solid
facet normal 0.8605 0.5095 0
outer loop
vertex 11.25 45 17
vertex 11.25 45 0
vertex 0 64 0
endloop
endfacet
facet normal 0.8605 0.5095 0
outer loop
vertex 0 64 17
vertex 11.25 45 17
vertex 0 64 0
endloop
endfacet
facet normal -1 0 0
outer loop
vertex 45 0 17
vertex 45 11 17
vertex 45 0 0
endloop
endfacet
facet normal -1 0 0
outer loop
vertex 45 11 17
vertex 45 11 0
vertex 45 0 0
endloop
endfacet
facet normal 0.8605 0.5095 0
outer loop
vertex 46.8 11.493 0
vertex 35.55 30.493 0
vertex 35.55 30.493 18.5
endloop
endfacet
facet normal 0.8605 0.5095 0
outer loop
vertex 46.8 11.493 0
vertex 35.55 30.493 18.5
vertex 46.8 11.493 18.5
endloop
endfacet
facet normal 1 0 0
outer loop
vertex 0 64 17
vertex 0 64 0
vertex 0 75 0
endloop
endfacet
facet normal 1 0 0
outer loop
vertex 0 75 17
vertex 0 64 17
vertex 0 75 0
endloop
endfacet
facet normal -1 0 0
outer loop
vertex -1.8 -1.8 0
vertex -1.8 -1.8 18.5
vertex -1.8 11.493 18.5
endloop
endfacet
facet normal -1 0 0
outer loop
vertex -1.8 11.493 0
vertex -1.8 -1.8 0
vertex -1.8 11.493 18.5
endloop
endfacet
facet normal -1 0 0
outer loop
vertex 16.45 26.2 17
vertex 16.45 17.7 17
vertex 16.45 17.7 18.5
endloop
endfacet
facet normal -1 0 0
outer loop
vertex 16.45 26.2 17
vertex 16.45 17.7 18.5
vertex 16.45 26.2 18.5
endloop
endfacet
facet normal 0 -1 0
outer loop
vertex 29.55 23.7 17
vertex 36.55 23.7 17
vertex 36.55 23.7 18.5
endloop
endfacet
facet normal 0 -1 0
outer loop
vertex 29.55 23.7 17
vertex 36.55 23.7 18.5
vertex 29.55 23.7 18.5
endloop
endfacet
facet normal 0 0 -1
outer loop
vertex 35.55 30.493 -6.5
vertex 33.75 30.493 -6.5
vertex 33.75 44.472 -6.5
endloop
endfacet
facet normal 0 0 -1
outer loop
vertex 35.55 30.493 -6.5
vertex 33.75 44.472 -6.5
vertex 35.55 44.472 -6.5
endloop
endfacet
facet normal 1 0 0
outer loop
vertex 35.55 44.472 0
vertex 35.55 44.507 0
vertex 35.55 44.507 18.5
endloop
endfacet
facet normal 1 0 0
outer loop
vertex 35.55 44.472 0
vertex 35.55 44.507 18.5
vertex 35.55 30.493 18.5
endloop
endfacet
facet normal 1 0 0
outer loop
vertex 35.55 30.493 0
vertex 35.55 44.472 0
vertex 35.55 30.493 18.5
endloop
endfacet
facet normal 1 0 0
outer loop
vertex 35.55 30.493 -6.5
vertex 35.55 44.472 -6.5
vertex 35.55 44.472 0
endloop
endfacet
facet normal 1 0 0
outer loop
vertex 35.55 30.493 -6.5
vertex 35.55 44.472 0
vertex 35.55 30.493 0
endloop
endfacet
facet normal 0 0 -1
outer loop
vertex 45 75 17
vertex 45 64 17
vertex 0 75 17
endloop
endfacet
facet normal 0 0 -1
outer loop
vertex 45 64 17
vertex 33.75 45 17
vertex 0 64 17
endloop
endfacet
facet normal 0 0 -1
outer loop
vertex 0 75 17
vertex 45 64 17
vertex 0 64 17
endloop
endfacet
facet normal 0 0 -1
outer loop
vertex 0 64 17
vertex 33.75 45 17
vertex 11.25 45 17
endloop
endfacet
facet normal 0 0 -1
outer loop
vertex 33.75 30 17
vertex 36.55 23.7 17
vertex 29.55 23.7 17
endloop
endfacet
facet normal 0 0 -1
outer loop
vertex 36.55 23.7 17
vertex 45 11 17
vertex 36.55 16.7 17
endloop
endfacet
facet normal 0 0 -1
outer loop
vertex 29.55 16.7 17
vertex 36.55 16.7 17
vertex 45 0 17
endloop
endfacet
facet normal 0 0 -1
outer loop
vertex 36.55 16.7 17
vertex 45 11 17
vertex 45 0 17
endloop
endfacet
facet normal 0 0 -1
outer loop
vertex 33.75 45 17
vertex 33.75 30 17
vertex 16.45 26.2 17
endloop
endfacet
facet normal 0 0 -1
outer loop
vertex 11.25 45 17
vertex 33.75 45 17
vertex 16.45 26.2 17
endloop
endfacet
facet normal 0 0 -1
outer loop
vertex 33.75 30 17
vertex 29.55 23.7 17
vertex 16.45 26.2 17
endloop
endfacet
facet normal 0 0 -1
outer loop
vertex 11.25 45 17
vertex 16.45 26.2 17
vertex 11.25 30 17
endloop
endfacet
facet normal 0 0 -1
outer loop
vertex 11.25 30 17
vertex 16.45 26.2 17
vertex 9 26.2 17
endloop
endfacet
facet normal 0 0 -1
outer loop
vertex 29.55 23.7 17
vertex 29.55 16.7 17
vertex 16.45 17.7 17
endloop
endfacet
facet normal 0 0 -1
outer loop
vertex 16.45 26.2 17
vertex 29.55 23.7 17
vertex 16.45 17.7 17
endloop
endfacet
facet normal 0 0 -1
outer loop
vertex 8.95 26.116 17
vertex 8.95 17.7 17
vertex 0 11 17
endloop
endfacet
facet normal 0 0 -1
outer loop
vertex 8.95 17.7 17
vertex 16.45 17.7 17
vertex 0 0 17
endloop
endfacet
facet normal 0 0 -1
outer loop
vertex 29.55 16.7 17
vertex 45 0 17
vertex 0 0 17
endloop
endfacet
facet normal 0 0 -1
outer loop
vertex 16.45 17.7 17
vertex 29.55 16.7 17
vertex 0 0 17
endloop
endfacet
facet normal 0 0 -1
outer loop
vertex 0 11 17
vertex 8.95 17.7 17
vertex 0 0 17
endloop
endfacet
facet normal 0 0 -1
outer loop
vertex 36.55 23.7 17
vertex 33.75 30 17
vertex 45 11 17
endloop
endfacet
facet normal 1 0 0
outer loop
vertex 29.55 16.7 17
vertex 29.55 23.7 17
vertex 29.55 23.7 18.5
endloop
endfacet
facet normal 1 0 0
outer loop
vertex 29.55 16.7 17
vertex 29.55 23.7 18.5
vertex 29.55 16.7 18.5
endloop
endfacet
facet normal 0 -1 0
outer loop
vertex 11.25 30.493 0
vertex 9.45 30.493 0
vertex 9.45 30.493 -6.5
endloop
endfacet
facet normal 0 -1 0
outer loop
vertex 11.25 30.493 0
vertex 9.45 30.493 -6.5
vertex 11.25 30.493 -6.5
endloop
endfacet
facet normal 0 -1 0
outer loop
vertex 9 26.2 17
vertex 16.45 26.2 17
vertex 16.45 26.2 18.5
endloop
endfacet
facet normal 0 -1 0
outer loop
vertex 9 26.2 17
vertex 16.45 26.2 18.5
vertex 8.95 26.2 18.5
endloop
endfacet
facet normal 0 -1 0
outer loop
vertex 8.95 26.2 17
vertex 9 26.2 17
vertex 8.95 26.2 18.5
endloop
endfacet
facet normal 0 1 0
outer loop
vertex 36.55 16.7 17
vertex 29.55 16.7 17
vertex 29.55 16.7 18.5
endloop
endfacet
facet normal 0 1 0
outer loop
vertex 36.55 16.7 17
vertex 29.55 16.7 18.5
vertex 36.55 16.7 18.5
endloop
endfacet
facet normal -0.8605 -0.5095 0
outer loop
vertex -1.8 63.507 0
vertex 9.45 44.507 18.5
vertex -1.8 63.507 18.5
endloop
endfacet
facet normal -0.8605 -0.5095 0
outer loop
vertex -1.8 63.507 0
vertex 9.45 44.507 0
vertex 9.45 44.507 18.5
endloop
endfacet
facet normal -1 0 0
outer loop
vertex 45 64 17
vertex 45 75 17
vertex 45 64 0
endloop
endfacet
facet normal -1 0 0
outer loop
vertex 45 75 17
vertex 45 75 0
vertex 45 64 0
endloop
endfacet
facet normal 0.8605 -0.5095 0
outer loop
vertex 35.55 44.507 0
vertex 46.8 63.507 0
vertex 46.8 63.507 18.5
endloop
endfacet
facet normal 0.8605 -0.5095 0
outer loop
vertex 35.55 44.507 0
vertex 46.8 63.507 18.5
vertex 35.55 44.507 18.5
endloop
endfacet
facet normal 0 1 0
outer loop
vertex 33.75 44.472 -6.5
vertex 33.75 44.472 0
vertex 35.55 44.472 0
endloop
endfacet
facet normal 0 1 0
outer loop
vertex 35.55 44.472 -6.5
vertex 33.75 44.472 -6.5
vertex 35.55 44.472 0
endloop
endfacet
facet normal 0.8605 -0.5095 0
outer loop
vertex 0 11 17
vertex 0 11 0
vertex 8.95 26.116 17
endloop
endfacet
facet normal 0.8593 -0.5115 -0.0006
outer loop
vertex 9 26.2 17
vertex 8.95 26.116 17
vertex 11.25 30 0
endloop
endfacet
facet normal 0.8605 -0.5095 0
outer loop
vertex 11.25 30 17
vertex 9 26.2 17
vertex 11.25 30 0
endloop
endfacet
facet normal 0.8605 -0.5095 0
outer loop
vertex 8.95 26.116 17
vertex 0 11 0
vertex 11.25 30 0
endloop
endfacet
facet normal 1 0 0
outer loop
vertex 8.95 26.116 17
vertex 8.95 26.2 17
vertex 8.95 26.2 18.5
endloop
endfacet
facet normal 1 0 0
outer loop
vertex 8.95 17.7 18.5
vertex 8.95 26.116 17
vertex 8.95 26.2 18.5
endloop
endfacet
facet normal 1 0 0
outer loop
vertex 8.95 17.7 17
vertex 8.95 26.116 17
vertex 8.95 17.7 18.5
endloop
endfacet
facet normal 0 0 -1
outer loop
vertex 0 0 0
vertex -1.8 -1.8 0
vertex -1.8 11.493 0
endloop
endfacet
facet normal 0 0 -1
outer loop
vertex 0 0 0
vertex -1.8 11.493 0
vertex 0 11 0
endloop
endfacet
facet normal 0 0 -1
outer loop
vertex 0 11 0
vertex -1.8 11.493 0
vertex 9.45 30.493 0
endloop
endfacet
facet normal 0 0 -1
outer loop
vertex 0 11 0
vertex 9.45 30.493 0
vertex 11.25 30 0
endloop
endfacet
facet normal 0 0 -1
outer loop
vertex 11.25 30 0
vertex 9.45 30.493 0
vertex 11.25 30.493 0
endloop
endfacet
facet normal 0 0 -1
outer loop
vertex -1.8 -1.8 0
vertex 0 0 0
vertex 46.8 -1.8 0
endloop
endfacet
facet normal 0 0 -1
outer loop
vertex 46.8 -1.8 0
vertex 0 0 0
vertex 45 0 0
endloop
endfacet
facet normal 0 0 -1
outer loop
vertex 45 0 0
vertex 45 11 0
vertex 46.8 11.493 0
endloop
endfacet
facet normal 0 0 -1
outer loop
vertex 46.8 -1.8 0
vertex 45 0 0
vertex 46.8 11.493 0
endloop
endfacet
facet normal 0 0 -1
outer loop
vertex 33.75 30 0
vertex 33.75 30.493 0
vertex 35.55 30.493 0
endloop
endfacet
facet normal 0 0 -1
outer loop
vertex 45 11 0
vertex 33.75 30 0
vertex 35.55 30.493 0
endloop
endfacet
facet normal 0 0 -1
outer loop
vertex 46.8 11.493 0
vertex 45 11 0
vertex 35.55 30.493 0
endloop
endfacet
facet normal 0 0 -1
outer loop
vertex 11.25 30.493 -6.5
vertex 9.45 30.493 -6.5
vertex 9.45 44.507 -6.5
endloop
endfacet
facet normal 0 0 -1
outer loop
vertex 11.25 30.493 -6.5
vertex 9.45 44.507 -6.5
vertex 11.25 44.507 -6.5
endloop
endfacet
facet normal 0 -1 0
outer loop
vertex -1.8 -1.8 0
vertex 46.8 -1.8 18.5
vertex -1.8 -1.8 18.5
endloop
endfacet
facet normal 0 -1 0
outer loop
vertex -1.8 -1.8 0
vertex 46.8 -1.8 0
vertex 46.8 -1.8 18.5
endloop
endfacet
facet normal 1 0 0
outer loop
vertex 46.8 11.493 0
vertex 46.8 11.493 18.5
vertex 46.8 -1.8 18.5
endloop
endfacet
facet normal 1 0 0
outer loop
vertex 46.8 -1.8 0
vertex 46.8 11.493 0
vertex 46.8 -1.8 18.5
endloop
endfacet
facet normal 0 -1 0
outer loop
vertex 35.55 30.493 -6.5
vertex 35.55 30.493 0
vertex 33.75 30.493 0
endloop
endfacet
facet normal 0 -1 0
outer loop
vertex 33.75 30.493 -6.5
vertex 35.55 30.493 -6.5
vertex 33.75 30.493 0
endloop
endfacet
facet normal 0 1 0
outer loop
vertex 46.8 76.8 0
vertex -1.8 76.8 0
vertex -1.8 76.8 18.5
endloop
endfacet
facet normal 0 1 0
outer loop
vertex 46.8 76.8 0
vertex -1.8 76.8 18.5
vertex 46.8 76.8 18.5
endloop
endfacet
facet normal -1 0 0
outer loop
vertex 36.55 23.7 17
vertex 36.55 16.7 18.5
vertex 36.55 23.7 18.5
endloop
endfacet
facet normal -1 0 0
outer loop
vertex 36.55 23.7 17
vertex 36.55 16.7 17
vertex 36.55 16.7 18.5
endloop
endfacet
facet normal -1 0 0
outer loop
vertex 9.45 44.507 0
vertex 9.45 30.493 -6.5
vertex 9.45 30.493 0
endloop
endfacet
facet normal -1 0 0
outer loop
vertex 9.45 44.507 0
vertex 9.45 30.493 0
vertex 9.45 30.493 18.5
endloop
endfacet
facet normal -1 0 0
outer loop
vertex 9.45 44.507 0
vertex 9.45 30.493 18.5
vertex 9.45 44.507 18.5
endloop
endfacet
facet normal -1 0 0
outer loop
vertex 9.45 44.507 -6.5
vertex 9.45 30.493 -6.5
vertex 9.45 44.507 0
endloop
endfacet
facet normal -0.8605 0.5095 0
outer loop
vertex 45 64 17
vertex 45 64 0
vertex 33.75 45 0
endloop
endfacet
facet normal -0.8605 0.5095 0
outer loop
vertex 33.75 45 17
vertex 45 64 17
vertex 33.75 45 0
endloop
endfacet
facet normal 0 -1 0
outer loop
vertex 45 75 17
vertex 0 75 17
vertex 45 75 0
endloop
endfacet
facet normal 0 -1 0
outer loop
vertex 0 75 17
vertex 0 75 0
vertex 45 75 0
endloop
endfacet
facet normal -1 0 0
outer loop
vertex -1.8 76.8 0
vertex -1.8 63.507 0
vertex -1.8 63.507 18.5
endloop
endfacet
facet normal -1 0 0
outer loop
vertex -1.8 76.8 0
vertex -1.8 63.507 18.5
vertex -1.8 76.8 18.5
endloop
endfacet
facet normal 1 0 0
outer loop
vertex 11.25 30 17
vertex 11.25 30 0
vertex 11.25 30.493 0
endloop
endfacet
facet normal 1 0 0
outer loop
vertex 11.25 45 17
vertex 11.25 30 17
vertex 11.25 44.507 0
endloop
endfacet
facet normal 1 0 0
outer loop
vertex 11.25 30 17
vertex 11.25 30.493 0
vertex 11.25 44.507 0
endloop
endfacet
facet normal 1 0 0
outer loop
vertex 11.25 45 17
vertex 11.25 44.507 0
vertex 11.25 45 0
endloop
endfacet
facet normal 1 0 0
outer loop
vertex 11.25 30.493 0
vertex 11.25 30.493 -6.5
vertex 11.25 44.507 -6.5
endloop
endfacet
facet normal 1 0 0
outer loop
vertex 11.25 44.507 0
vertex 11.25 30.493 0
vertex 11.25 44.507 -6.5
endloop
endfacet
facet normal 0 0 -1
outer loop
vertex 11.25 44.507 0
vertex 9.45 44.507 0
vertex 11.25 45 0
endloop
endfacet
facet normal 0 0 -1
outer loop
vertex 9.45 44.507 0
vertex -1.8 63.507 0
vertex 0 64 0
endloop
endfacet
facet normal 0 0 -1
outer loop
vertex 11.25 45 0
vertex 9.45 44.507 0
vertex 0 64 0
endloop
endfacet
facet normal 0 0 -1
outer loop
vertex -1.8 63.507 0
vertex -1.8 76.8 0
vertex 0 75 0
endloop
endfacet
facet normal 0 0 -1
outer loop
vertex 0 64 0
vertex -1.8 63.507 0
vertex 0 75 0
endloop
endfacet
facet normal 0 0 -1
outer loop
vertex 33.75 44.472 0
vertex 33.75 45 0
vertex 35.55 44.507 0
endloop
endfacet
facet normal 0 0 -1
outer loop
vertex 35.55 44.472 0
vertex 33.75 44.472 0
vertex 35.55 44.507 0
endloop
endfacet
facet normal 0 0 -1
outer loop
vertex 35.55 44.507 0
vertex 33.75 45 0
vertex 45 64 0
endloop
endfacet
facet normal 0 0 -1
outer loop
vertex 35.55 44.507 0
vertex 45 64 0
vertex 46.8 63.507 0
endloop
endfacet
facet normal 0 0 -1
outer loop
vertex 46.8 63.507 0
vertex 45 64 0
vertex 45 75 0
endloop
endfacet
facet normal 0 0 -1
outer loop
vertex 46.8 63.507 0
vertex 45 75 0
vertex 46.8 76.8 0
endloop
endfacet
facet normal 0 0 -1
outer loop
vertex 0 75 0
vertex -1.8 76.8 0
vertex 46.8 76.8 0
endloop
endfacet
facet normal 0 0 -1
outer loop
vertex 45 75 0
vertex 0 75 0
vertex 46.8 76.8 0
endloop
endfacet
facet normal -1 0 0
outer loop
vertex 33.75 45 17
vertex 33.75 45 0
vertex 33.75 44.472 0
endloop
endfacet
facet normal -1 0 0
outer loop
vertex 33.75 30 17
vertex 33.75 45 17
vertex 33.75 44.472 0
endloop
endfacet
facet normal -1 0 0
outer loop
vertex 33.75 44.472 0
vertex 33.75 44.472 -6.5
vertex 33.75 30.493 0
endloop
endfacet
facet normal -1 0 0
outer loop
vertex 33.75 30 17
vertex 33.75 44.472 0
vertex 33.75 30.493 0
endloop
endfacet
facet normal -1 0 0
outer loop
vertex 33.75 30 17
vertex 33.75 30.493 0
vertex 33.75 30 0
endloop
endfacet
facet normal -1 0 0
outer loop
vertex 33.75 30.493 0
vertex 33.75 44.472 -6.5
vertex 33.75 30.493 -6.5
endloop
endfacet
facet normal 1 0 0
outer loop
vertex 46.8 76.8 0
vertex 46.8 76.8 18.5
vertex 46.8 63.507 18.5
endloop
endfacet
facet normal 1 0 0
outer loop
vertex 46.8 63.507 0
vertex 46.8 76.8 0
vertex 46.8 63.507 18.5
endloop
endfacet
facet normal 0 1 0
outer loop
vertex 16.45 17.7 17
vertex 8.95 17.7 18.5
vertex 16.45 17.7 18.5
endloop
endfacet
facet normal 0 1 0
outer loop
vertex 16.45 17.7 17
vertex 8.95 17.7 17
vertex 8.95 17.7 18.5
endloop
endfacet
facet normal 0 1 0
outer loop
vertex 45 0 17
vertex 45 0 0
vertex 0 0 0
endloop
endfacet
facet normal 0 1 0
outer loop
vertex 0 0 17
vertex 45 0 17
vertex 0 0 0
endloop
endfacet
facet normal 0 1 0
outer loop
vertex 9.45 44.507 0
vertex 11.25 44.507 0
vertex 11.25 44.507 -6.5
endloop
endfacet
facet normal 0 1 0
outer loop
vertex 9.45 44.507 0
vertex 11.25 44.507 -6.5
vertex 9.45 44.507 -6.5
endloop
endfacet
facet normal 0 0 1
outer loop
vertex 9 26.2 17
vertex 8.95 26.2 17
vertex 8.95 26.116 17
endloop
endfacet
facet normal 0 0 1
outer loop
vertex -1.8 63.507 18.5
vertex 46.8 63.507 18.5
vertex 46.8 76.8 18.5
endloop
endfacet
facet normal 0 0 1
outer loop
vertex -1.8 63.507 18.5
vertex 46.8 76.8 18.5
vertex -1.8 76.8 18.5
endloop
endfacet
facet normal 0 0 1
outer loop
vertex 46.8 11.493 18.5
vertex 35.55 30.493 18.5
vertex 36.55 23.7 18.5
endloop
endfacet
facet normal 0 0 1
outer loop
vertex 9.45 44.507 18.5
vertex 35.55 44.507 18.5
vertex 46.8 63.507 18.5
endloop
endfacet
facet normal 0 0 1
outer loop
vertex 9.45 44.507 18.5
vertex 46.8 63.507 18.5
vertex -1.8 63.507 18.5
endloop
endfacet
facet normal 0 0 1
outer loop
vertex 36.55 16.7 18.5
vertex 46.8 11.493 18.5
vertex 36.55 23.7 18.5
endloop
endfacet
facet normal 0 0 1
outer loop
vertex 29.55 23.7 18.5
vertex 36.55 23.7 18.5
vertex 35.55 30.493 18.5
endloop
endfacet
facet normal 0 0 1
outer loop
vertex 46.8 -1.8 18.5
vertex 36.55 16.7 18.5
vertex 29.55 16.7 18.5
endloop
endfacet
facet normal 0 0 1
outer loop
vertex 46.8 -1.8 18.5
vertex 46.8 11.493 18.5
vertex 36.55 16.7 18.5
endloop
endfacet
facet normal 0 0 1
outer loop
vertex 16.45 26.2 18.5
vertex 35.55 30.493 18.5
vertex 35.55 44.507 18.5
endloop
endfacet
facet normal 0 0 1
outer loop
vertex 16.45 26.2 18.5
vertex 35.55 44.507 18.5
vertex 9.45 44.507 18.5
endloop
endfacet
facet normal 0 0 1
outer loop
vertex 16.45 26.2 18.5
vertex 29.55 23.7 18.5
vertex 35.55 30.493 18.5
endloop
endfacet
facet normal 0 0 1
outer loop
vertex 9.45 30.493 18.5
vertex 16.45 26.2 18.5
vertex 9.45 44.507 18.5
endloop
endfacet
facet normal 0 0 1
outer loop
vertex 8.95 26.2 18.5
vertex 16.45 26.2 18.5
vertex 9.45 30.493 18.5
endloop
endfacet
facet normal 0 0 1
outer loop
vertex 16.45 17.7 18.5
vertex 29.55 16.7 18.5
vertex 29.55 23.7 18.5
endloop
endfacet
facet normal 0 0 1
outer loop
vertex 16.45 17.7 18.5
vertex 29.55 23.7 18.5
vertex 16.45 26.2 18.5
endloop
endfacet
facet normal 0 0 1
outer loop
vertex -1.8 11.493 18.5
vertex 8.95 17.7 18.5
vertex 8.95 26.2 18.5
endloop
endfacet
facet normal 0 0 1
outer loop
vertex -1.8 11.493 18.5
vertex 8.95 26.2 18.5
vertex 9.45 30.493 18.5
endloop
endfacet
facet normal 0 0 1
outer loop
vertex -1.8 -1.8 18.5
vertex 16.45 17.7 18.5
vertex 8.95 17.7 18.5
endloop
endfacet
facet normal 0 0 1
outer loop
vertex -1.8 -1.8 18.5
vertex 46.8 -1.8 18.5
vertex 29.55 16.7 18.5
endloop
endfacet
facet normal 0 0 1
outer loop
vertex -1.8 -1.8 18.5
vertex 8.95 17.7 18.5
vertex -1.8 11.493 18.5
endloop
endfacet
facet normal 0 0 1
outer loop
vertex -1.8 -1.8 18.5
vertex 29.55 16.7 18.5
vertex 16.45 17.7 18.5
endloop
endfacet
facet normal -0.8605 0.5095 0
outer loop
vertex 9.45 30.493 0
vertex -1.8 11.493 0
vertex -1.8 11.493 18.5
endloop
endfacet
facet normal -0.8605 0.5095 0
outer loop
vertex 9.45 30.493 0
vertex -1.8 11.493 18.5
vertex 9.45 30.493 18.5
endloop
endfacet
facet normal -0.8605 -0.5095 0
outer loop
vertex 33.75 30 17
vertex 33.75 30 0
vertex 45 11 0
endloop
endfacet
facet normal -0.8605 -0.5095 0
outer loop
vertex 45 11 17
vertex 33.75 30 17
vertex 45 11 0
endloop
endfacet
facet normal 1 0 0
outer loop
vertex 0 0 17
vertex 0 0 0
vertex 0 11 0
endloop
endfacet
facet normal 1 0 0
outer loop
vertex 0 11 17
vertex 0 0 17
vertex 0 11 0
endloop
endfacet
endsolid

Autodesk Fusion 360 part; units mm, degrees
sketch "Sketch1" plane through (0, 0, 0) normal (0, 0, 1) x (1, 0, 0)
  line L0 (0, 0) -> (0, 11)
  line L1 (0, 11) -> (11.25, 30)
  line L2 (11.25, 30) -> (11.25, 45)
  line L3 (0, 75) -> (45, 75)
  line L4 (33.75, 45) -> (33.75, 30)
  line L5 (33.75, 30) -> (45, 11)
  line L6 (45, 11) -> (45, 0)
  line L7 (45, 0) -> (0, 0)
  line L8 (11.25, 45) -> (0, 64)
  line L9 (0, 64) -> (0, 75)
  line L10 (45, 75) -> (45, 64)
  line L11 (45, 64) -> (33.75, 45)
  line L12 (-1.8, 76.8) -> (46.8, 76.8)
  line L13 (46.8, 76.8) -> (46.8, 63.5071)
  line L14 (46.8, 63.5071) -> (35.55, 44.5071)
  line L15 (35.55, 44.5071) -> (35.55, 30.4929)
  line L16 (35.55, 30.4929) -> (46.8, 11.4929)
  line L17 (46.8, 11.4929) -> (46.8, -1.8)
  line L18 (46.8, -1.8) -> (-1.8, -1.8)
  line L19 (-1.8, -1.8) -> (-1.8, 11.4929)
  line L20 (-1.8, 11.4929) -> (9.45, 30.4929)
  line L21 (9.45, 30.4929) -> (9.45, 44.5071)
  line L22 (9.45, 44.5071) -> (-1.8, 63.5071)
  line L23 (-1.8, 63.5071) -> (-1.8, 76.8)
  dimension "d1" = 75
  dimension "d2" = 45
  dimension "d3" = 45
  dimension "d4" = 11
  dimension "d5" = 11
  dimension "d7" = 30
  dimension "d8" = 30
  dimension "d9" = 30
  dimension "d10" = 30
  dimension "d13" = 11.25
  dimension "d14" = 90
  dimension "d15" = 11
  dimension "d16" = 11
  dimension "d17" = 11.25
  dimension "d18" = 11.25
  dimension "d19" = 1.8
  dimension "d20" = 1.8
  dimension "d21" = 1.8
  dimension "d22" = 1.8
  dimension "d24" = 1.8
  dimension "d25" = 1.8
  dimension "d26" = 1.8
  dimension "d27" = 1.8
  dimension "d28" = 1.8
  dimension "d29" = 1.8
  dimension "d30" = 1.8
  dimension "d31" = 1.8
extrude "Extrude1" add sketch "Sketch1" along normal blind 17
sketch "Sketch2" plane through (0, 0, 17) normal (0, 0, 1) x (-1, 0, 0)
  line L0 (-45, -75) -> (-45, -64)
  line L1 (-45, -64) -> (-33.75, -45)
  line L2 (-33.75, -45) -> (-33.75, -30)
  line L3 (-33.75, -30) -> (-45, -11)
  line L4 (-45, -11) -> (-45, 0)
  line L5 (-45, 0) -> (0, 0)
  line L6 (0, 0) -> (0, -11)
  line L7 (0, -11) -> (-11.25, -30)
  line L8 (-11.25, -30) -> (-11.25, -45)
  line L9 (-11.25, -45) -> (0, -64)
  line L10 (0, -64) -> (0, -75)
  line L11 (0, -75) -> (-45, -75)
  line L12 (1.8, -63.5071) -> (-9.45, -44.5071)
  line L13 (-9.45, -44.5071) -> (-9.45, -30.4929)
  line L14 (-9.45, -30.4929) -> (1.8, -11.4929)
  line L15 (1.8, -11.4929) -> (1.8, 1.8)
  line L16 (1.8, 1.8) -> (-46.8, 1.8)
  line L17 (-46.8, 1.8) -> (-46.8, -11.4929)
  line L18 (-46.8, -11.4929) -> (-35.55, -30.4929)
  line L19 (-35.55, -30.4929) -> (-35.55, -44.5071)
  line L20 (-35.55, -44.5071) -> (-46.8, -63.5071)
  line L21 (-46.8, -63.5071) -> (-46.8, -76.8)
  line L22 (-46.8, -76.8) -> (1.8, -76.8)
  line L23 (1.8, -76.8) -> (1.8, -63.5071)
  line L24 (1.8, -76.8) -> (1.8, -63.5071)
  line L25 (-9.45, -44.5071) -> (-9.45, -30.4929)
  line L26 (1.8, -11.4929) -> (1.8, 1.8)
  line L27 (-46.8, 1.8) -> (-46.8, -11.4929)
  line L28 (-35.55, -30.4929) -> (-35.55, -44.5071)
  line L29 (-46.8, -63.5071) -> (-46.8, -76.8)
extrude "Extrude2" add sketch "Sketch2" along normal blind 1.5 contours L0 L1 L2 L3 L4 L5 L6 L7 L8 L9 L10 L11 | L12 L13 L14 L15 L16 L17 L18 L19 L20 L21 L22 L23 L24 L25 L26 L27 L28 L29
sketch "Sketch3" plane through (0, 0, 17) normal (0, 0, -1) x (1, 0, 0)
  line L0 (0, -75) -> (45, -75)
  line L1 (45, -75) -> (45, -64)
  line L2 (45, -64) -> (33.75, -45)
  line L3 (33.75, -45) -> (33.75, -30)
  line L4 (33.75, -30) -> (45, -11)
  line L5 (45, -11) -> (45, 0)
  line L6 (45, 0) -> (0, 0)
  line L7 (0, 0) -> (0, -11)
  line L8 (0, -11) -> (11.25, -30)
  line L9 (11.25, -30) -> (11.25, -45)
  line L10 (11.25, -45) -> (0, -64)
  line L11 (0, -64) -> (0, -75)
  line L12 (8.95, -17.7) -> (16.45, -17.7)
  line L13 (16.45, -17.7) -> (16.45, -26.2)
  line L14 (16.45, -26.2) -> (8.95, -26.2)
  line L15 (8.95, -26.2) -> (8.95, -17.7)
  line L16 (9.45, -30.4929) -> (9.45, -44.5071)
  line L17 (29.55, -16.7) -> (36.55, -16.7)
  line L18 (36.55, -16.7) -> (36.55, -23.7)
  line L19 (36.55, -23.7) -> (29.55, -23.7)
  line L20 (29.55, -23.7) -> (29.55, -16.7)
  line L21 (46.8, 1.8) -> (-1.8, 1.8)
  line L22 (46.8, -11.4929) -> (46.8, 1.8)
  dimension "d37" = 8.5
  dimension "d38" = 7.5
  dimension "d43" = 25.5
  dimension "d44" = 17.25
  dimension "d45" = 7
  dimension "d46" = 7
  dimension "d49" = 0.5
  dimension "d50" = 28
extrude "Extrude3" cut sketch "Sketch3" against normal blind 7 contours L8 L14 L15 | L8 L12 L13 L14 L15 | L17 L18 L19 L20
sketch "Sketch4" plane through (0, 0, 0) normal (0, 0, -1) x (1, 0, 0)
  line L0 (45, -64) -> (45, -75)
  line L1 (45, -75) -> (0, -75)
  line L2 (0, -75) -> (0, -64)
  line L3 (0, -64) -> (11.25, -45)
  line L4 (11.25, -45) -> (11.25, -30)
  line L5 (11.25, -30) -> (0, -11)
  line L6 (0, -11) -> (0, 0)
  line L7 (0, 0) -> (45, 0)
  line L8 (45, 0) -> (45, -11)
  line L9 (45, -11) -> (33.75, -30)
  line L10 (33.75, -30) -> (33.75, -45)
  line L11 (33.75, -45) -> (45, -64)
  line L12 (9.45, -44.5071) -> (-1.8, -63.5071)
  line L13 (-1.8, -63.5071) -> (-1.8, -76.8)
  line L14 (-1.8, -76.8) -> (46.8, -76.8)
  line L15 (46.8, -76.8) -> (46.8, -63.5071)
  line L16 (46.8, -63.5071) -> (35.55, -44.5071)
  line L17 (35.55, -44.5071) -> (35.55, -30.4929)
  line L18 (35.55, -30.4929) -> (46.8, -11.4929)
  line L19 (46.8, -11.4929) -> (46.8, 1.8)
  line L20 (46.8, 1.8) -> (-1.8, 1.8)
  line L21 (-1.8, 1.8) -> (-1.8, -11.4929)
  line L22 (-1.8, -11.4929) -> (9.45, -30.4929)
  line L23 (9.45, -30.4929) -> (9.45, -44.5071)
  line L24 (9.45, -30.4929) -> (11.25, -30.4929)
  line L25 (11.25, -30.4929) -> (11.25, -44.5071)
  line L26 (11.25, -44.5071) -> (9.45, -44.5071)
  line L27 (9.45, -44.5071) -> (9.45, -30.4929)
  line L28 (35.55, -30.4929) -> (33.75, -30.4929)
  line L29 (33.75, -30.4929) -> (33.75, -44.4721)
  line L30 (33.75, -44.4721) -> (35.55, -44.4721)
  line L31 (35.55, -44.4721) -> (35.55, -30.4929)
extrude "Extrude4" add sketch "Sketch4" along normal blind 6.5 contours L10 L17 L28 L29 L30 L31 | L4 L23 L24 L25 L26 L27
